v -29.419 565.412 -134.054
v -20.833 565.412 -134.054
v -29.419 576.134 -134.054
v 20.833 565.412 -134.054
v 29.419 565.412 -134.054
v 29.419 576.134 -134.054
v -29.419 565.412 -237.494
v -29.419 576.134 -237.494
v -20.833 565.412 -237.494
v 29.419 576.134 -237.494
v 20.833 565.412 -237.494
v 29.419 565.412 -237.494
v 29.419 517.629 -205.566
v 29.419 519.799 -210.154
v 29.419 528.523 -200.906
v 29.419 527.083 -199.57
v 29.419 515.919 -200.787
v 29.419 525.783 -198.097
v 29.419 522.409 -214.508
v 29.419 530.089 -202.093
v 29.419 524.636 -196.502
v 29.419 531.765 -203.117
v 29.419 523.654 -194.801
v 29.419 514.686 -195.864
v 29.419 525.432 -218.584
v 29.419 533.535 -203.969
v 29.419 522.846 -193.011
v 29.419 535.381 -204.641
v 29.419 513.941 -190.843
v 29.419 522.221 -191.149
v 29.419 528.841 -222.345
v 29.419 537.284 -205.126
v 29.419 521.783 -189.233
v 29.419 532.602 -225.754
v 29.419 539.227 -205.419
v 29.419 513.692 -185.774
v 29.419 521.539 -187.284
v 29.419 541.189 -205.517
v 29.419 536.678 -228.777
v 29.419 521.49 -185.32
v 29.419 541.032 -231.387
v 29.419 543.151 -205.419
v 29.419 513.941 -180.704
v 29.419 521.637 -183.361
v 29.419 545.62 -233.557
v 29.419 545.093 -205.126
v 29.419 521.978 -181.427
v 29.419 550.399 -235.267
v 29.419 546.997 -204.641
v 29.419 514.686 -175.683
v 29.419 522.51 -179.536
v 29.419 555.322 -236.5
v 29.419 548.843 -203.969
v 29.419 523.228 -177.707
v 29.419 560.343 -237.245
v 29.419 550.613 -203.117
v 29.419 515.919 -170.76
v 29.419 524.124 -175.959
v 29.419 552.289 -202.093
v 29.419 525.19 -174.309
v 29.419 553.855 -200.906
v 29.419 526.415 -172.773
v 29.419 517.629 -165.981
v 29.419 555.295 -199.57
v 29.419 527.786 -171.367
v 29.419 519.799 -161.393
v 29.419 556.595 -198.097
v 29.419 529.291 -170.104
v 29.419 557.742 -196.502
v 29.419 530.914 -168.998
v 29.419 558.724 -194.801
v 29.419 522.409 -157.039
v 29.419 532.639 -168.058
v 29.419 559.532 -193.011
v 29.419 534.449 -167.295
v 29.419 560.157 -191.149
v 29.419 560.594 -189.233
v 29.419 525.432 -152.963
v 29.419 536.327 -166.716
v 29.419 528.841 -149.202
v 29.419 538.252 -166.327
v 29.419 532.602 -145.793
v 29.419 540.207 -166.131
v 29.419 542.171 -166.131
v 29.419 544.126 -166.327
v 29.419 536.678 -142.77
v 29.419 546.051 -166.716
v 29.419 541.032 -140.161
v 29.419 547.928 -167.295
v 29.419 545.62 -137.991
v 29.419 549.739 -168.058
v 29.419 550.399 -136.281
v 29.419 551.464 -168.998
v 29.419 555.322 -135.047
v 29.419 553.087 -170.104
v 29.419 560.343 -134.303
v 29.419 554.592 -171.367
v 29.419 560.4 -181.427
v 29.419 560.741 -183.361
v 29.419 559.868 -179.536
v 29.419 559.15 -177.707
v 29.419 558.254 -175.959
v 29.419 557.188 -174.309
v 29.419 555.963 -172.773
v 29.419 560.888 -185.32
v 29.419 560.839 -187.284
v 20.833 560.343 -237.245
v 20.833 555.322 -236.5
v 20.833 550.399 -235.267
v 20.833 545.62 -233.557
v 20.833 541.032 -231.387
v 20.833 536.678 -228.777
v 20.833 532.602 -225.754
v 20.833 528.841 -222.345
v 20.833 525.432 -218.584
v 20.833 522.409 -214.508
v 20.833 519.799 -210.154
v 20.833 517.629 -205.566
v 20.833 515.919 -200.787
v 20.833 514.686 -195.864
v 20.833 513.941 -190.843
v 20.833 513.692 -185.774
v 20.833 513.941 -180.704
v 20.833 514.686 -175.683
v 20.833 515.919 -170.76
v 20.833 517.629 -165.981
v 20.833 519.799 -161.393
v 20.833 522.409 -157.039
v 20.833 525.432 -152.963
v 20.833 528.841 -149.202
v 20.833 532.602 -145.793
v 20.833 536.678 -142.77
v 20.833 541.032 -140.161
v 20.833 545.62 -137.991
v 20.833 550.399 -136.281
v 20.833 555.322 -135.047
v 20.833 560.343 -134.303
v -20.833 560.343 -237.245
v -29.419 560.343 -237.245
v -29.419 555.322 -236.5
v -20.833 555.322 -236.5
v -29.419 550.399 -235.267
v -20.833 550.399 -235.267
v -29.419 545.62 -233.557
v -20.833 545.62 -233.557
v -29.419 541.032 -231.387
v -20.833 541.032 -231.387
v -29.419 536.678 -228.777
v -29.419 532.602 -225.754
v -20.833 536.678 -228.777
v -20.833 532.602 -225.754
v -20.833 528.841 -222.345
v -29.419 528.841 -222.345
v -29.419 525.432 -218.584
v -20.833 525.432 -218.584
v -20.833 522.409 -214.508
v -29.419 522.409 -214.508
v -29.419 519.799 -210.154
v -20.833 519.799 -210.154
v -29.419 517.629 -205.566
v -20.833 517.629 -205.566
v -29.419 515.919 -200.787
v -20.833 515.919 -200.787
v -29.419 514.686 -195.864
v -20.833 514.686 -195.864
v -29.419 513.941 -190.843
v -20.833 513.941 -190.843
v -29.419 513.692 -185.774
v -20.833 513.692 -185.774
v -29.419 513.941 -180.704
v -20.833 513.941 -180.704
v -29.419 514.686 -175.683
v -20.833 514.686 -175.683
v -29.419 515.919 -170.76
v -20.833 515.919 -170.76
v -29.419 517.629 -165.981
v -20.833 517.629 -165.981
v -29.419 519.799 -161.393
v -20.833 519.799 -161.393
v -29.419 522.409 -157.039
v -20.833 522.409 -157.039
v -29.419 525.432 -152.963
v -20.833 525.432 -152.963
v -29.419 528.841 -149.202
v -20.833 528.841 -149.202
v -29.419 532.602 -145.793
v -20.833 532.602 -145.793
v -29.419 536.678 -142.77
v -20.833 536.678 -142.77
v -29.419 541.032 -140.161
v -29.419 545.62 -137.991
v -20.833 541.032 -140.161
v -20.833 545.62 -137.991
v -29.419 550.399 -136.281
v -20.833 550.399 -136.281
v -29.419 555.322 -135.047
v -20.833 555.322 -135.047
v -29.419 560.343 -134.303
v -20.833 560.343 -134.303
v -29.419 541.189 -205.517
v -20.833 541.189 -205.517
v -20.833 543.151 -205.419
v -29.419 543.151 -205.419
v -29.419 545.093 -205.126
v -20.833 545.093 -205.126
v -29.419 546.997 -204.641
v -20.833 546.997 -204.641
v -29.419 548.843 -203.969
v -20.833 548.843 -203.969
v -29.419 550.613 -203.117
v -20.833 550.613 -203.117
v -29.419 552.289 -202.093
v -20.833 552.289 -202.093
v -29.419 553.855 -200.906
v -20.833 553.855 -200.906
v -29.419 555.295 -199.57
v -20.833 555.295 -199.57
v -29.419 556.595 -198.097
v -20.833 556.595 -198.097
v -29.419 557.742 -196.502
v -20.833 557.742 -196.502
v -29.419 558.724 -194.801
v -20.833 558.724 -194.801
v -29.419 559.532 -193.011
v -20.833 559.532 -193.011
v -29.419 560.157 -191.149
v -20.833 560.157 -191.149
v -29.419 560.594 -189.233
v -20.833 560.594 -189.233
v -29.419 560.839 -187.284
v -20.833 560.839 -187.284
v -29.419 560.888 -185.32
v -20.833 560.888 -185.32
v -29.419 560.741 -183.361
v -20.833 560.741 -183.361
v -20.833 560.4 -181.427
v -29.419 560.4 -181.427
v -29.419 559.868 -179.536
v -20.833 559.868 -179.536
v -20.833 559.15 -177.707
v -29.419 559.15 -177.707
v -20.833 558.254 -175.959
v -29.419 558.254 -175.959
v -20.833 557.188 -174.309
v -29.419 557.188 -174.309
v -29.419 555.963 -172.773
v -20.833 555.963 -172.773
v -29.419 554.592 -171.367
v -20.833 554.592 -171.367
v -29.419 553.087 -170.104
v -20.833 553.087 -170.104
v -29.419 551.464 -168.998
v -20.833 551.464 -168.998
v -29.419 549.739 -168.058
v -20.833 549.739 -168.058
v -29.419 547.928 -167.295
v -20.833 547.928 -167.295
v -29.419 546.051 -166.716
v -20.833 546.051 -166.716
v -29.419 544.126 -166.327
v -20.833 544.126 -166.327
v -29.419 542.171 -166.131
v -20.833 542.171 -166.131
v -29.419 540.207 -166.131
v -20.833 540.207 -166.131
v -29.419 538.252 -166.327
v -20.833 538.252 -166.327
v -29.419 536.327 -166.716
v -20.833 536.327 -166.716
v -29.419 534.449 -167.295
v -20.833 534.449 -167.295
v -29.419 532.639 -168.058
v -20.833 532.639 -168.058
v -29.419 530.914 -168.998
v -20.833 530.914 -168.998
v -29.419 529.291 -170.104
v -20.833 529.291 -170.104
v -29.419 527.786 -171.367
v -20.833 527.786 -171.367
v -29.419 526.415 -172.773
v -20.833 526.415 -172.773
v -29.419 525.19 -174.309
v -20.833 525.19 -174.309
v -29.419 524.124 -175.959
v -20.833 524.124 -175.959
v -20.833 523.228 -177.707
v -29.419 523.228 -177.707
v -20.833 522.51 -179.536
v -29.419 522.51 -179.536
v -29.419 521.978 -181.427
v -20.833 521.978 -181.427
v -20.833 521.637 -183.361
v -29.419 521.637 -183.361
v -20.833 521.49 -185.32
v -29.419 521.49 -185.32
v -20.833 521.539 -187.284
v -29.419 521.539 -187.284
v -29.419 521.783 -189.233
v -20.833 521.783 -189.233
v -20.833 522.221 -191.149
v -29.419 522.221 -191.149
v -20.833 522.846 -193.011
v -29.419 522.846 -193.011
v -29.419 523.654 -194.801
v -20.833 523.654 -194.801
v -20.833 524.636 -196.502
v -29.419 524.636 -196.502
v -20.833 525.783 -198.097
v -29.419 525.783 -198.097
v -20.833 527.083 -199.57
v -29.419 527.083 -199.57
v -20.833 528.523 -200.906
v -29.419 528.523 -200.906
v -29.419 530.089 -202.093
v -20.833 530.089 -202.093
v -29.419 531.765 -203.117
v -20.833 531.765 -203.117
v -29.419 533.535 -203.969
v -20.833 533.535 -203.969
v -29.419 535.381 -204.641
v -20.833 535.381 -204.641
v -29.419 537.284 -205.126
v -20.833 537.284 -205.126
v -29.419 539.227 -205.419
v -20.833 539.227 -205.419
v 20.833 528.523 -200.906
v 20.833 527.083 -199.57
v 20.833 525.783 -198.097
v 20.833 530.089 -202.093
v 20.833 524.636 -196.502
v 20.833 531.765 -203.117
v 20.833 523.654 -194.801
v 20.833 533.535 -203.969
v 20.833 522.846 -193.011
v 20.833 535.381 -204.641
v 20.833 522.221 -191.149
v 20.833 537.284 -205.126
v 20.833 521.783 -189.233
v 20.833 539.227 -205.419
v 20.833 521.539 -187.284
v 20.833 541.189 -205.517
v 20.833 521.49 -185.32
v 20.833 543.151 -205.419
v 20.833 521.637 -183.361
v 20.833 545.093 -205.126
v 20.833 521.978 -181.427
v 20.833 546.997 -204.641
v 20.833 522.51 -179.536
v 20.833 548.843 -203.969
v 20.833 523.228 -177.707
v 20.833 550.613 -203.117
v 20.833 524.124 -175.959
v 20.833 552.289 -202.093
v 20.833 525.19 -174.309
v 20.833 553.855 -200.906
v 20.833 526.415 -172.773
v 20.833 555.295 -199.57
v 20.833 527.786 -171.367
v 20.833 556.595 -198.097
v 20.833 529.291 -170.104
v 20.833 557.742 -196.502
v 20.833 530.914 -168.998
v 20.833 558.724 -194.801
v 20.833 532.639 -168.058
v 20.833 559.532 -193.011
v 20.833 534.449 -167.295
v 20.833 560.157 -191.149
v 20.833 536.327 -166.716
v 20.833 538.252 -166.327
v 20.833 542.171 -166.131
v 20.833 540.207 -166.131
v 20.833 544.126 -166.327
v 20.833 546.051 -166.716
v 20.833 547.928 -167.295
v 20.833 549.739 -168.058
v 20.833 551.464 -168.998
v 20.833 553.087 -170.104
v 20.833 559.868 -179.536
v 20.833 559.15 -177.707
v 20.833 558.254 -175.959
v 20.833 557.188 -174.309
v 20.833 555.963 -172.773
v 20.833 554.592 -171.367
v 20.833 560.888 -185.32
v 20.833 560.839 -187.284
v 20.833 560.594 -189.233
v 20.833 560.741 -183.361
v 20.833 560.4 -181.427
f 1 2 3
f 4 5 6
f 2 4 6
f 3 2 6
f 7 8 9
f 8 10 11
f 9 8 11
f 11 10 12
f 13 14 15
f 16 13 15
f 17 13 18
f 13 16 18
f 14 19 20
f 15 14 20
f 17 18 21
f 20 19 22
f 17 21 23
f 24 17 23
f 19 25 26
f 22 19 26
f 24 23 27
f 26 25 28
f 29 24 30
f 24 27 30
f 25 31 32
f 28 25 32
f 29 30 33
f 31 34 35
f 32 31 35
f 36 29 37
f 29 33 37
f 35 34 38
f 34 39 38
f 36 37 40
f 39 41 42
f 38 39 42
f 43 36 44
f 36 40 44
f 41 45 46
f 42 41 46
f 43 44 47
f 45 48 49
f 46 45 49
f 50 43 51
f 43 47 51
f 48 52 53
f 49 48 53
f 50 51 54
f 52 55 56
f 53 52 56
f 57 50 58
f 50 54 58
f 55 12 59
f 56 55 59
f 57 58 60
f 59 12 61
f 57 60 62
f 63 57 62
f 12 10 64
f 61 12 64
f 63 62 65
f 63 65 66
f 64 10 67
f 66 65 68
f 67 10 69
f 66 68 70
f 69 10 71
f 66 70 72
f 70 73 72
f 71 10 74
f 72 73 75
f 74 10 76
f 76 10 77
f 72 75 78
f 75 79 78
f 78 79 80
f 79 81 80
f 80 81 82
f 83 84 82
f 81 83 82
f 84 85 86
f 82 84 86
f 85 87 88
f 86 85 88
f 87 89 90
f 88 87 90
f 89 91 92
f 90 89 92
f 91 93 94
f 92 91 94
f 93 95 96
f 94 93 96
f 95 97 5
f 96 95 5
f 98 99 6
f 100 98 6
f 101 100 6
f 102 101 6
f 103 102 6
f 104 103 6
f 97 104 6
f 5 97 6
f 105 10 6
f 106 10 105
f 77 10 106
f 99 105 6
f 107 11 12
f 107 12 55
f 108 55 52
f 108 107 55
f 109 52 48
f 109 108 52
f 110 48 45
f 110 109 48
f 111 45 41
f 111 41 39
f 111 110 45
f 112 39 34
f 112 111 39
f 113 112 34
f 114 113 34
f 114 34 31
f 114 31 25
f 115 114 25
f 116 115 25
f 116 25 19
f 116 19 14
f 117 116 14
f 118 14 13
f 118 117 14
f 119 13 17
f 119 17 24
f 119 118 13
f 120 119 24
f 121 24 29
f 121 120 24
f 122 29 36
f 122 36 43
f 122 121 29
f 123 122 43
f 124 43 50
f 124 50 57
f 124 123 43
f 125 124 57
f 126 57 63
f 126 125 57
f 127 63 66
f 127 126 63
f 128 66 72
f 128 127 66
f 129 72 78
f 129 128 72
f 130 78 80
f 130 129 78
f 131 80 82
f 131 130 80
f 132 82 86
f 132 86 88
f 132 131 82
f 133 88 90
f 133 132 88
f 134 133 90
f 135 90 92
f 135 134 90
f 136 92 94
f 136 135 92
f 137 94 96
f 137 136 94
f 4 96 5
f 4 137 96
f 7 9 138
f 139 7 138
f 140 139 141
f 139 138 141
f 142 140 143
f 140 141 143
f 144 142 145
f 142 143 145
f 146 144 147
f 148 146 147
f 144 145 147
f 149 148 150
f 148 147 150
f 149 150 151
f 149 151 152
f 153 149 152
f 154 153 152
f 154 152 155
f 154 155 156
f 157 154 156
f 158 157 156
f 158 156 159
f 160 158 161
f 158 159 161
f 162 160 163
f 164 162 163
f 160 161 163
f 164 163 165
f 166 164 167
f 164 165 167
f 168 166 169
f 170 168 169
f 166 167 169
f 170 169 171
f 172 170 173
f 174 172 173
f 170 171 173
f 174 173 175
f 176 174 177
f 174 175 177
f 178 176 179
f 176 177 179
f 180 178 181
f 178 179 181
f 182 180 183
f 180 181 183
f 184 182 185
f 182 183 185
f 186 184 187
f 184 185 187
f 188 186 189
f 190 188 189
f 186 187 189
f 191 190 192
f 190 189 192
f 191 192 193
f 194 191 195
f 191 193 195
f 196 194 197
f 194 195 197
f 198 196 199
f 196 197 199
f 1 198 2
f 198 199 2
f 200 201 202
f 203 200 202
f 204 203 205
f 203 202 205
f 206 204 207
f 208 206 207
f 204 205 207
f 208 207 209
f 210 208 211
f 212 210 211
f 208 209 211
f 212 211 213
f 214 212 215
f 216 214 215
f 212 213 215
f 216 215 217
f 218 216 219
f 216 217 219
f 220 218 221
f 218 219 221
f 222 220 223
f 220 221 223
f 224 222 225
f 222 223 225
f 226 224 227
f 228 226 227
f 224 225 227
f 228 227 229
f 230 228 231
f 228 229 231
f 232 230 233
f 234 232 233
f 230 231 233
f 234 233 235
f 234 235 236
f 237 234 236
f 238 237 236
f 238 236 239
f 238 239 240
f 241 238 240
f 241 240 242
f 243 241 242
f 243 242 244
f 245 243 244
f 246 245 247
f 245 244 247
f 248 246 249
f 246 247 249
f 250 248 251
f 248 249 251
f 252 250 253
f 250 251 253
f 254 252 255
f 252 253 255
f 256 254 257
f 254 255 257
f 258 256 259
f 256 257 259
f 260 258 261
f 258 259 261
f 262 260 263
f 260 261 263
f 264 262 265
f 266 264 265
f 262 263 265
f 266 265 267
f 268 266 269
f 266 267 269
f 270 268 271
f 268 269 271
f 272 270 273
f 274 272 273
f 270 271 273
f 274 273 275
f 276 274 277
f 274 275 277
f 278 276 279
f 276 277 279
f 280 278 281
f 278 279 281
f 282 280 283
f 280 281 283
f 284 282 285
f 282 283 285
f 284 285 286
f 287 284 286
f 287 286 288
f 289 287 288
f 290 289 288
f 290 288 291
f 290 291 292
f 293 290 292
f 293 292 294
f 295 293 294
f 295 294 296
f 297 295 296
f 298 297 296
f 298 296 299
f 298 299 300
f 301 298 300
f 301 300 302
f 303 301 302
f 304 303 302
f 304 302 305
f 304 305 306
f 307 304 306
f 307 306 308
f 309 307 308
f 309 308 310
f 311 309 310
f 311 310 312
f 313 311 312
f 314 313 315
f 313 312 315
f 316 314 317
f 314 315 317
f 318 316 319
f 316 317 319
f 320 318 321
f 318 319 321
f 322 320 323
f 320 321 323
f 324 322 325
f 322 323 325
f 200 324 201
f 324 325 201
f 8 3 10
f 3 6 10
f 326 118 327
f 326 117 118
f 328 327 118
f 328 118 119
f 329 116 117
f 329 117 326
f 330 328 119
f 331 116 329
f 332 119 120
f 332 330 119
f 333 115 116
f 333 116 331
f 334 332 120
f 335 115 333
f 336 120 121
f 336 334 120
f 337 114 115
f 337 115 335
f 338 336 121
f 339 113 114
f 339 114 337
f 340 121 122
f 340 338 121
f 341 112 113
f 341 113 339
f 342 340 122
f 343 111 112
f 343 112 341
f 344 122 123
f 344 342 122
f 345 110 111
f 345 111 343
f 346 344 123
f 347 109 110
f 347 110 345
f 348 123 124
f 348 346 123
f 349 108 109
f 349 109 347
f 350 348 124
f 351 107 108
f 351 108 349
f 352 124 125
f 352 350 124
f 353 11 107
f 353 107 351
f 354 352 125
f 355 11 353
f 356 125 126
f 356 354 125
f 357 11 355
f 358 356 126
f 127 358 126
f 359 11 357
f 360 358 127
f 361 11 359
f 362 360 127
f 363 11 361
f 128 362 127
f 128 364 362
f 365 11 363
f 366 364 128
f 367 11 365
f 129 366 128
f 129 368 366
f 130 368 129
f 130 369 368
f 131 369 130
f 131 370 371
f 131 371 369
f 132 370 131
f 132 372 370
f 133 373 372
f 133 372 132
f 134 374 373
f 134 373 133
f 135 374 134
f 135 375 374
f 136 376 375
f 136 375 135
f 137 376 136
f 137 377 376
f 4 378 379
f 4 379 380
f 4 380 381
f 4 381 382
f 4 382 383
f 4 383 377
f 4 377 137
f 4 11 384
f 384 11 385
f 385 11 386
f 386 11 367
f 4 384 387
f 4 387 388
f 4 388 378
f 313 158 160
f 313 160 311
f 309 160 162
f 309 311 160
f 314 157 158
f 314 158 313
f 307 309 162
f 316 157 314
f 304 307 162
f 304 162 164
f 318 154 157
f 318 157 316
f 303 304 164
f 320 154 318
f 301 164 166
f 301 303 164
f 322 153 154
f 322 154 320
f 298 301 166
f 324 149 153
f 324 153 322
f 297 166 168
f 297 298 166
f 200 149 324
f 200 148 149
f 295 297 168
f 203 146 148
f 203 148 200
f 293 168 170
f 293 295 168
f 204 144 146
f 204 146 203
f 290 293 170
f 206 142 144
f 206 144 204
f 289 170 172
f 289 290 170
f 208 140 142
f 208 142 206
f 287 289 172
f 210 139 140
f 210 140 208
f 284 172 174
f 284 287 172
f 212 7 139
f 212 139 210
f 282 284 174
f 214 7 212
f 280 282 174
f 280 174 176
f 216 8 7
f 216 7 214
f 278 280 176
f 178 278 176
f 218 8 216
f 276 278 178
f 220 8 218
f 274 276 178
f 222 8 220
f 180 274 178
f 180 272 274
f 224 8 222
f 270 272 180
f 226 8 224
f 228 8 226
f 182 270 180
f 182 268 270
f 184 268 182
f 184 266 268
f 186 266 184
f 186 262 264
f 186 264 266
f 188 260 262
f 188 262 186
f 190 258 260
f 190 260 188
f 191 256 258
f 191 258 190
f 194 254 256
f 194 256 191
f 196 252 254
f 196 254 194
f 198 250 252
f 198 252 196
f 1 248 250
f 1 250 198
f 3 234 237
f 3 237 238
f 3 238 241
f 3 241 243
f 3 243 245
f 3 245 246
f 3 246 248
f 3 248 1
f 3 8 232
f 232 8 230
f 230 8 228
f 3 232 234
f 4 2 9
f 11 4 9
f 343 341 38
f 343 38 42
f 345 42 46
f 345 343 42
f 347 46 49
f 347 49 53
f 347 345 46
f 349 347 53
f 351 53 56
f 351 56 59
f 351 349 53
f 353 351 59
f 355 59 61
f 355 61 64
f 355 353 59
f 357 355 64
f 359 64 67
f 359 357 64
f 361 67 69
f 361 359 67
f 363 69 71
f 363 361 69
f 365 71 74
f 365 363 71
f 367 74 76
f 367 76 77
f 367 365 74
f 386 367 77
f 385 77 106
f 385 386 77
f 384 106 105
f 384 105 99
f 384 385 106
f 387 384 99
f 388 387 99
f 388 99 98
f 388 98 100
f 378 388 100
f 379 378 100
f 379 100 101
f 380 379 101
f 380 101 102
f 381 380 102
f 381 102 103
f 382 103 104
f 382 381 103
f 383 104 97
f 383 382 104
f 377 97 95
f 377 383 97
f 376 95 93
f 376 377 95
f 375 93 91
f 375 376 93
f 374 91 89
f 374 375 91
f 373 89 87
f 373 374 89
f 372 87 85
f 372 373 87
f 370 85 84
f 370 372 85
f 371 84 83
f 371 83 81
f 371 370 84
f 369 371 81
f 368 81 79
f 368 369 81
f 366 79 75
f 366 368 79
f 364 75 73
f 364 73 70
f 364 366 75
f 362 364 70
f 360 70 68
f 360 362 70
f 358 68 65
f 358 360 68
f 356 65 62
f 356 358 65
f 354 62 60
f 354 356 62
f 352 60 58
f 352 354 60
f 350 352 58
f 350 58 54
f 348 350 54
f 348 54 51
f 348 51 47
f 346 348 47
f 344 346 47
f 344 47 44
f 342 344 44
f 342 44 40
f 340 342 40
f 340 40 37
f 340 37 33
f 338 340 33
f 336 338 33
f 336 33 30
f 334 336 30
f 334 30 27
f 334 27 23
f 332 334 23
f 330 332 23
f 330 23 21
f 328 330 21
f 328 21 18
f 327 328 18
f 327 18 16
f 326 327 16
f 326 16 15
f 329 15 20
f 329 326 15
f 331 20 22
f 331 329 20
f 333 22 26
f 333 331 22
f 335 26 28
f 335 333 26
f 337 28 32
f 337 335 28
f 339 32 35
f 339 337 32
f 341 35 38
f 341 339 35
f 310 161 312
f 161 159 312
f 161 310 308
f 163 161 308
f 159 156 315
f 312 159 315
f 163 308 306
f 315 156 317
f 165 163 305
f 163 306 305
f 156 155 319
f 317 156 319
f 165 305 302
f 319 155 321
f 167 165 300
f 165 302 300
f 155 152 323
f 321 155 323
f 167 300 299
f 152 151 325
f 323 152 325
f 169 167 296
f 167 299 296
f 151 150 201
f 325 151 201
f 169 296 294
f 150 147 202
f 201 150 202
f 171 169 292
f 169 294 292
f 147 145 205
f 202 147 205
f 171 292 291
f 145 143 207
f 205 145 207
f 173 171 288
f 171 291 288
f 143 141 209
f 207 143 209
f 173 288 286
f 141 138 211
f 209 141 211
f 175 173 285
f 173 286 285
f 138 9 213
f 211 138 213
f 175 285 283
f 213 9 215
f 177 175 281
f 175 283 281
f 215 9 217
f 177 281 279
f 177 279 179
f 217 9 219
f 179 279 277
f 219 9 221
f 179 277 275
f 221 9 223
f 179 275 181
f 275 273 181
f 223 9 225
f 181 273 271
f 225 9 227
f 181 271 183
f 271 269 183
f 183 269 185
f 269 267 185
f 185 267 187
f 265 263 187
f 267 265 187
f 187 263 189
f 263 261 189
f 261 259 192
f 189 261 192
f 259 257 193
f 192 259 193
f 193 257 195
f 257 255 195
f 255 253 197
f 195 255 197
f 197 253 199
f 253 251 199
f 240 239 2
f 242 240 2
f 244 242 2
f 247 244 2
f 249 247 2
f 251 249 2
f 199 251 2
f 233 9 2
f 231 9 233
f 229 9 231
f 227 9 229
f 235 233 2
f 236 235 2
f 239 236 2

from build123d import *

# Parameters (mm, degrees)
BOSS_EXTRUDE1_DEPTH      = 20.832572
BOSS_EXTRUDE1_DEPTH_BACK = 20.832572
SKETCH1_W                = 103.439976
SKETCH1_H                = 10.722102
SKETCH2_R                = 19.704892681
BOSS_EXTRUDE2_DEPTH      = 8.586216


with BuildPart() as part:
    # Sketch1 → Boss-Extrude1 (new, two sides: drawn at the far end of the back side and taken through both)
    with BuildSketch(Plane(origin=(0, 0, 0), x_dir=(0, 0, -1), z_dir=(1, 0, 0)).offset(-BOSS_EXTRUDE1_DEPTH_BACK)):
        with Locations((185.773568, 570.773433)):
            Rectangle(SKETCH1_W, SKETCH1_H)
    extrude(amount=BOSS_EXTRUDE1_DEPTH + BOSS_EXTRUDE1_DEPTH_BACK)

    # Sketch2 → Boss-Extrude2 (add)
    with BuildSketch(Plane(origin=(20.832572, 0, 0), x_dir=(0, 0, -1), z_dir=(1, 0, 0))):
        with BuildLine():
            Line((134.05358, 565.412382), (134.05358, 576.134484))
            Line((134.05358, 576.134484), (237.493556, 576.134484))
            Line((237.493556, 576.134484), (237.493556, 565.412382))
            ThreePointArc((237.493556, 565.412382), (185.773568, 513.692394), (134.05358, 565.412382))
        make_face()
        with Locations((185.811668, 541.18891)):
            Circle(SKETCH2_R, mode=Mode.SUBTRACT)
    boss_extrude2 = extrude(amount=BOSS_EXTRUDE2_DEPTH)

    # Mirror1: Boss-Extrude2 across plane
    add(boss_extrude2.mirror(Plane(origin=(0, 0, 0), x_dir=(0, 0, 1), z_dir=(1, 0, 0))))


solid = part.part
